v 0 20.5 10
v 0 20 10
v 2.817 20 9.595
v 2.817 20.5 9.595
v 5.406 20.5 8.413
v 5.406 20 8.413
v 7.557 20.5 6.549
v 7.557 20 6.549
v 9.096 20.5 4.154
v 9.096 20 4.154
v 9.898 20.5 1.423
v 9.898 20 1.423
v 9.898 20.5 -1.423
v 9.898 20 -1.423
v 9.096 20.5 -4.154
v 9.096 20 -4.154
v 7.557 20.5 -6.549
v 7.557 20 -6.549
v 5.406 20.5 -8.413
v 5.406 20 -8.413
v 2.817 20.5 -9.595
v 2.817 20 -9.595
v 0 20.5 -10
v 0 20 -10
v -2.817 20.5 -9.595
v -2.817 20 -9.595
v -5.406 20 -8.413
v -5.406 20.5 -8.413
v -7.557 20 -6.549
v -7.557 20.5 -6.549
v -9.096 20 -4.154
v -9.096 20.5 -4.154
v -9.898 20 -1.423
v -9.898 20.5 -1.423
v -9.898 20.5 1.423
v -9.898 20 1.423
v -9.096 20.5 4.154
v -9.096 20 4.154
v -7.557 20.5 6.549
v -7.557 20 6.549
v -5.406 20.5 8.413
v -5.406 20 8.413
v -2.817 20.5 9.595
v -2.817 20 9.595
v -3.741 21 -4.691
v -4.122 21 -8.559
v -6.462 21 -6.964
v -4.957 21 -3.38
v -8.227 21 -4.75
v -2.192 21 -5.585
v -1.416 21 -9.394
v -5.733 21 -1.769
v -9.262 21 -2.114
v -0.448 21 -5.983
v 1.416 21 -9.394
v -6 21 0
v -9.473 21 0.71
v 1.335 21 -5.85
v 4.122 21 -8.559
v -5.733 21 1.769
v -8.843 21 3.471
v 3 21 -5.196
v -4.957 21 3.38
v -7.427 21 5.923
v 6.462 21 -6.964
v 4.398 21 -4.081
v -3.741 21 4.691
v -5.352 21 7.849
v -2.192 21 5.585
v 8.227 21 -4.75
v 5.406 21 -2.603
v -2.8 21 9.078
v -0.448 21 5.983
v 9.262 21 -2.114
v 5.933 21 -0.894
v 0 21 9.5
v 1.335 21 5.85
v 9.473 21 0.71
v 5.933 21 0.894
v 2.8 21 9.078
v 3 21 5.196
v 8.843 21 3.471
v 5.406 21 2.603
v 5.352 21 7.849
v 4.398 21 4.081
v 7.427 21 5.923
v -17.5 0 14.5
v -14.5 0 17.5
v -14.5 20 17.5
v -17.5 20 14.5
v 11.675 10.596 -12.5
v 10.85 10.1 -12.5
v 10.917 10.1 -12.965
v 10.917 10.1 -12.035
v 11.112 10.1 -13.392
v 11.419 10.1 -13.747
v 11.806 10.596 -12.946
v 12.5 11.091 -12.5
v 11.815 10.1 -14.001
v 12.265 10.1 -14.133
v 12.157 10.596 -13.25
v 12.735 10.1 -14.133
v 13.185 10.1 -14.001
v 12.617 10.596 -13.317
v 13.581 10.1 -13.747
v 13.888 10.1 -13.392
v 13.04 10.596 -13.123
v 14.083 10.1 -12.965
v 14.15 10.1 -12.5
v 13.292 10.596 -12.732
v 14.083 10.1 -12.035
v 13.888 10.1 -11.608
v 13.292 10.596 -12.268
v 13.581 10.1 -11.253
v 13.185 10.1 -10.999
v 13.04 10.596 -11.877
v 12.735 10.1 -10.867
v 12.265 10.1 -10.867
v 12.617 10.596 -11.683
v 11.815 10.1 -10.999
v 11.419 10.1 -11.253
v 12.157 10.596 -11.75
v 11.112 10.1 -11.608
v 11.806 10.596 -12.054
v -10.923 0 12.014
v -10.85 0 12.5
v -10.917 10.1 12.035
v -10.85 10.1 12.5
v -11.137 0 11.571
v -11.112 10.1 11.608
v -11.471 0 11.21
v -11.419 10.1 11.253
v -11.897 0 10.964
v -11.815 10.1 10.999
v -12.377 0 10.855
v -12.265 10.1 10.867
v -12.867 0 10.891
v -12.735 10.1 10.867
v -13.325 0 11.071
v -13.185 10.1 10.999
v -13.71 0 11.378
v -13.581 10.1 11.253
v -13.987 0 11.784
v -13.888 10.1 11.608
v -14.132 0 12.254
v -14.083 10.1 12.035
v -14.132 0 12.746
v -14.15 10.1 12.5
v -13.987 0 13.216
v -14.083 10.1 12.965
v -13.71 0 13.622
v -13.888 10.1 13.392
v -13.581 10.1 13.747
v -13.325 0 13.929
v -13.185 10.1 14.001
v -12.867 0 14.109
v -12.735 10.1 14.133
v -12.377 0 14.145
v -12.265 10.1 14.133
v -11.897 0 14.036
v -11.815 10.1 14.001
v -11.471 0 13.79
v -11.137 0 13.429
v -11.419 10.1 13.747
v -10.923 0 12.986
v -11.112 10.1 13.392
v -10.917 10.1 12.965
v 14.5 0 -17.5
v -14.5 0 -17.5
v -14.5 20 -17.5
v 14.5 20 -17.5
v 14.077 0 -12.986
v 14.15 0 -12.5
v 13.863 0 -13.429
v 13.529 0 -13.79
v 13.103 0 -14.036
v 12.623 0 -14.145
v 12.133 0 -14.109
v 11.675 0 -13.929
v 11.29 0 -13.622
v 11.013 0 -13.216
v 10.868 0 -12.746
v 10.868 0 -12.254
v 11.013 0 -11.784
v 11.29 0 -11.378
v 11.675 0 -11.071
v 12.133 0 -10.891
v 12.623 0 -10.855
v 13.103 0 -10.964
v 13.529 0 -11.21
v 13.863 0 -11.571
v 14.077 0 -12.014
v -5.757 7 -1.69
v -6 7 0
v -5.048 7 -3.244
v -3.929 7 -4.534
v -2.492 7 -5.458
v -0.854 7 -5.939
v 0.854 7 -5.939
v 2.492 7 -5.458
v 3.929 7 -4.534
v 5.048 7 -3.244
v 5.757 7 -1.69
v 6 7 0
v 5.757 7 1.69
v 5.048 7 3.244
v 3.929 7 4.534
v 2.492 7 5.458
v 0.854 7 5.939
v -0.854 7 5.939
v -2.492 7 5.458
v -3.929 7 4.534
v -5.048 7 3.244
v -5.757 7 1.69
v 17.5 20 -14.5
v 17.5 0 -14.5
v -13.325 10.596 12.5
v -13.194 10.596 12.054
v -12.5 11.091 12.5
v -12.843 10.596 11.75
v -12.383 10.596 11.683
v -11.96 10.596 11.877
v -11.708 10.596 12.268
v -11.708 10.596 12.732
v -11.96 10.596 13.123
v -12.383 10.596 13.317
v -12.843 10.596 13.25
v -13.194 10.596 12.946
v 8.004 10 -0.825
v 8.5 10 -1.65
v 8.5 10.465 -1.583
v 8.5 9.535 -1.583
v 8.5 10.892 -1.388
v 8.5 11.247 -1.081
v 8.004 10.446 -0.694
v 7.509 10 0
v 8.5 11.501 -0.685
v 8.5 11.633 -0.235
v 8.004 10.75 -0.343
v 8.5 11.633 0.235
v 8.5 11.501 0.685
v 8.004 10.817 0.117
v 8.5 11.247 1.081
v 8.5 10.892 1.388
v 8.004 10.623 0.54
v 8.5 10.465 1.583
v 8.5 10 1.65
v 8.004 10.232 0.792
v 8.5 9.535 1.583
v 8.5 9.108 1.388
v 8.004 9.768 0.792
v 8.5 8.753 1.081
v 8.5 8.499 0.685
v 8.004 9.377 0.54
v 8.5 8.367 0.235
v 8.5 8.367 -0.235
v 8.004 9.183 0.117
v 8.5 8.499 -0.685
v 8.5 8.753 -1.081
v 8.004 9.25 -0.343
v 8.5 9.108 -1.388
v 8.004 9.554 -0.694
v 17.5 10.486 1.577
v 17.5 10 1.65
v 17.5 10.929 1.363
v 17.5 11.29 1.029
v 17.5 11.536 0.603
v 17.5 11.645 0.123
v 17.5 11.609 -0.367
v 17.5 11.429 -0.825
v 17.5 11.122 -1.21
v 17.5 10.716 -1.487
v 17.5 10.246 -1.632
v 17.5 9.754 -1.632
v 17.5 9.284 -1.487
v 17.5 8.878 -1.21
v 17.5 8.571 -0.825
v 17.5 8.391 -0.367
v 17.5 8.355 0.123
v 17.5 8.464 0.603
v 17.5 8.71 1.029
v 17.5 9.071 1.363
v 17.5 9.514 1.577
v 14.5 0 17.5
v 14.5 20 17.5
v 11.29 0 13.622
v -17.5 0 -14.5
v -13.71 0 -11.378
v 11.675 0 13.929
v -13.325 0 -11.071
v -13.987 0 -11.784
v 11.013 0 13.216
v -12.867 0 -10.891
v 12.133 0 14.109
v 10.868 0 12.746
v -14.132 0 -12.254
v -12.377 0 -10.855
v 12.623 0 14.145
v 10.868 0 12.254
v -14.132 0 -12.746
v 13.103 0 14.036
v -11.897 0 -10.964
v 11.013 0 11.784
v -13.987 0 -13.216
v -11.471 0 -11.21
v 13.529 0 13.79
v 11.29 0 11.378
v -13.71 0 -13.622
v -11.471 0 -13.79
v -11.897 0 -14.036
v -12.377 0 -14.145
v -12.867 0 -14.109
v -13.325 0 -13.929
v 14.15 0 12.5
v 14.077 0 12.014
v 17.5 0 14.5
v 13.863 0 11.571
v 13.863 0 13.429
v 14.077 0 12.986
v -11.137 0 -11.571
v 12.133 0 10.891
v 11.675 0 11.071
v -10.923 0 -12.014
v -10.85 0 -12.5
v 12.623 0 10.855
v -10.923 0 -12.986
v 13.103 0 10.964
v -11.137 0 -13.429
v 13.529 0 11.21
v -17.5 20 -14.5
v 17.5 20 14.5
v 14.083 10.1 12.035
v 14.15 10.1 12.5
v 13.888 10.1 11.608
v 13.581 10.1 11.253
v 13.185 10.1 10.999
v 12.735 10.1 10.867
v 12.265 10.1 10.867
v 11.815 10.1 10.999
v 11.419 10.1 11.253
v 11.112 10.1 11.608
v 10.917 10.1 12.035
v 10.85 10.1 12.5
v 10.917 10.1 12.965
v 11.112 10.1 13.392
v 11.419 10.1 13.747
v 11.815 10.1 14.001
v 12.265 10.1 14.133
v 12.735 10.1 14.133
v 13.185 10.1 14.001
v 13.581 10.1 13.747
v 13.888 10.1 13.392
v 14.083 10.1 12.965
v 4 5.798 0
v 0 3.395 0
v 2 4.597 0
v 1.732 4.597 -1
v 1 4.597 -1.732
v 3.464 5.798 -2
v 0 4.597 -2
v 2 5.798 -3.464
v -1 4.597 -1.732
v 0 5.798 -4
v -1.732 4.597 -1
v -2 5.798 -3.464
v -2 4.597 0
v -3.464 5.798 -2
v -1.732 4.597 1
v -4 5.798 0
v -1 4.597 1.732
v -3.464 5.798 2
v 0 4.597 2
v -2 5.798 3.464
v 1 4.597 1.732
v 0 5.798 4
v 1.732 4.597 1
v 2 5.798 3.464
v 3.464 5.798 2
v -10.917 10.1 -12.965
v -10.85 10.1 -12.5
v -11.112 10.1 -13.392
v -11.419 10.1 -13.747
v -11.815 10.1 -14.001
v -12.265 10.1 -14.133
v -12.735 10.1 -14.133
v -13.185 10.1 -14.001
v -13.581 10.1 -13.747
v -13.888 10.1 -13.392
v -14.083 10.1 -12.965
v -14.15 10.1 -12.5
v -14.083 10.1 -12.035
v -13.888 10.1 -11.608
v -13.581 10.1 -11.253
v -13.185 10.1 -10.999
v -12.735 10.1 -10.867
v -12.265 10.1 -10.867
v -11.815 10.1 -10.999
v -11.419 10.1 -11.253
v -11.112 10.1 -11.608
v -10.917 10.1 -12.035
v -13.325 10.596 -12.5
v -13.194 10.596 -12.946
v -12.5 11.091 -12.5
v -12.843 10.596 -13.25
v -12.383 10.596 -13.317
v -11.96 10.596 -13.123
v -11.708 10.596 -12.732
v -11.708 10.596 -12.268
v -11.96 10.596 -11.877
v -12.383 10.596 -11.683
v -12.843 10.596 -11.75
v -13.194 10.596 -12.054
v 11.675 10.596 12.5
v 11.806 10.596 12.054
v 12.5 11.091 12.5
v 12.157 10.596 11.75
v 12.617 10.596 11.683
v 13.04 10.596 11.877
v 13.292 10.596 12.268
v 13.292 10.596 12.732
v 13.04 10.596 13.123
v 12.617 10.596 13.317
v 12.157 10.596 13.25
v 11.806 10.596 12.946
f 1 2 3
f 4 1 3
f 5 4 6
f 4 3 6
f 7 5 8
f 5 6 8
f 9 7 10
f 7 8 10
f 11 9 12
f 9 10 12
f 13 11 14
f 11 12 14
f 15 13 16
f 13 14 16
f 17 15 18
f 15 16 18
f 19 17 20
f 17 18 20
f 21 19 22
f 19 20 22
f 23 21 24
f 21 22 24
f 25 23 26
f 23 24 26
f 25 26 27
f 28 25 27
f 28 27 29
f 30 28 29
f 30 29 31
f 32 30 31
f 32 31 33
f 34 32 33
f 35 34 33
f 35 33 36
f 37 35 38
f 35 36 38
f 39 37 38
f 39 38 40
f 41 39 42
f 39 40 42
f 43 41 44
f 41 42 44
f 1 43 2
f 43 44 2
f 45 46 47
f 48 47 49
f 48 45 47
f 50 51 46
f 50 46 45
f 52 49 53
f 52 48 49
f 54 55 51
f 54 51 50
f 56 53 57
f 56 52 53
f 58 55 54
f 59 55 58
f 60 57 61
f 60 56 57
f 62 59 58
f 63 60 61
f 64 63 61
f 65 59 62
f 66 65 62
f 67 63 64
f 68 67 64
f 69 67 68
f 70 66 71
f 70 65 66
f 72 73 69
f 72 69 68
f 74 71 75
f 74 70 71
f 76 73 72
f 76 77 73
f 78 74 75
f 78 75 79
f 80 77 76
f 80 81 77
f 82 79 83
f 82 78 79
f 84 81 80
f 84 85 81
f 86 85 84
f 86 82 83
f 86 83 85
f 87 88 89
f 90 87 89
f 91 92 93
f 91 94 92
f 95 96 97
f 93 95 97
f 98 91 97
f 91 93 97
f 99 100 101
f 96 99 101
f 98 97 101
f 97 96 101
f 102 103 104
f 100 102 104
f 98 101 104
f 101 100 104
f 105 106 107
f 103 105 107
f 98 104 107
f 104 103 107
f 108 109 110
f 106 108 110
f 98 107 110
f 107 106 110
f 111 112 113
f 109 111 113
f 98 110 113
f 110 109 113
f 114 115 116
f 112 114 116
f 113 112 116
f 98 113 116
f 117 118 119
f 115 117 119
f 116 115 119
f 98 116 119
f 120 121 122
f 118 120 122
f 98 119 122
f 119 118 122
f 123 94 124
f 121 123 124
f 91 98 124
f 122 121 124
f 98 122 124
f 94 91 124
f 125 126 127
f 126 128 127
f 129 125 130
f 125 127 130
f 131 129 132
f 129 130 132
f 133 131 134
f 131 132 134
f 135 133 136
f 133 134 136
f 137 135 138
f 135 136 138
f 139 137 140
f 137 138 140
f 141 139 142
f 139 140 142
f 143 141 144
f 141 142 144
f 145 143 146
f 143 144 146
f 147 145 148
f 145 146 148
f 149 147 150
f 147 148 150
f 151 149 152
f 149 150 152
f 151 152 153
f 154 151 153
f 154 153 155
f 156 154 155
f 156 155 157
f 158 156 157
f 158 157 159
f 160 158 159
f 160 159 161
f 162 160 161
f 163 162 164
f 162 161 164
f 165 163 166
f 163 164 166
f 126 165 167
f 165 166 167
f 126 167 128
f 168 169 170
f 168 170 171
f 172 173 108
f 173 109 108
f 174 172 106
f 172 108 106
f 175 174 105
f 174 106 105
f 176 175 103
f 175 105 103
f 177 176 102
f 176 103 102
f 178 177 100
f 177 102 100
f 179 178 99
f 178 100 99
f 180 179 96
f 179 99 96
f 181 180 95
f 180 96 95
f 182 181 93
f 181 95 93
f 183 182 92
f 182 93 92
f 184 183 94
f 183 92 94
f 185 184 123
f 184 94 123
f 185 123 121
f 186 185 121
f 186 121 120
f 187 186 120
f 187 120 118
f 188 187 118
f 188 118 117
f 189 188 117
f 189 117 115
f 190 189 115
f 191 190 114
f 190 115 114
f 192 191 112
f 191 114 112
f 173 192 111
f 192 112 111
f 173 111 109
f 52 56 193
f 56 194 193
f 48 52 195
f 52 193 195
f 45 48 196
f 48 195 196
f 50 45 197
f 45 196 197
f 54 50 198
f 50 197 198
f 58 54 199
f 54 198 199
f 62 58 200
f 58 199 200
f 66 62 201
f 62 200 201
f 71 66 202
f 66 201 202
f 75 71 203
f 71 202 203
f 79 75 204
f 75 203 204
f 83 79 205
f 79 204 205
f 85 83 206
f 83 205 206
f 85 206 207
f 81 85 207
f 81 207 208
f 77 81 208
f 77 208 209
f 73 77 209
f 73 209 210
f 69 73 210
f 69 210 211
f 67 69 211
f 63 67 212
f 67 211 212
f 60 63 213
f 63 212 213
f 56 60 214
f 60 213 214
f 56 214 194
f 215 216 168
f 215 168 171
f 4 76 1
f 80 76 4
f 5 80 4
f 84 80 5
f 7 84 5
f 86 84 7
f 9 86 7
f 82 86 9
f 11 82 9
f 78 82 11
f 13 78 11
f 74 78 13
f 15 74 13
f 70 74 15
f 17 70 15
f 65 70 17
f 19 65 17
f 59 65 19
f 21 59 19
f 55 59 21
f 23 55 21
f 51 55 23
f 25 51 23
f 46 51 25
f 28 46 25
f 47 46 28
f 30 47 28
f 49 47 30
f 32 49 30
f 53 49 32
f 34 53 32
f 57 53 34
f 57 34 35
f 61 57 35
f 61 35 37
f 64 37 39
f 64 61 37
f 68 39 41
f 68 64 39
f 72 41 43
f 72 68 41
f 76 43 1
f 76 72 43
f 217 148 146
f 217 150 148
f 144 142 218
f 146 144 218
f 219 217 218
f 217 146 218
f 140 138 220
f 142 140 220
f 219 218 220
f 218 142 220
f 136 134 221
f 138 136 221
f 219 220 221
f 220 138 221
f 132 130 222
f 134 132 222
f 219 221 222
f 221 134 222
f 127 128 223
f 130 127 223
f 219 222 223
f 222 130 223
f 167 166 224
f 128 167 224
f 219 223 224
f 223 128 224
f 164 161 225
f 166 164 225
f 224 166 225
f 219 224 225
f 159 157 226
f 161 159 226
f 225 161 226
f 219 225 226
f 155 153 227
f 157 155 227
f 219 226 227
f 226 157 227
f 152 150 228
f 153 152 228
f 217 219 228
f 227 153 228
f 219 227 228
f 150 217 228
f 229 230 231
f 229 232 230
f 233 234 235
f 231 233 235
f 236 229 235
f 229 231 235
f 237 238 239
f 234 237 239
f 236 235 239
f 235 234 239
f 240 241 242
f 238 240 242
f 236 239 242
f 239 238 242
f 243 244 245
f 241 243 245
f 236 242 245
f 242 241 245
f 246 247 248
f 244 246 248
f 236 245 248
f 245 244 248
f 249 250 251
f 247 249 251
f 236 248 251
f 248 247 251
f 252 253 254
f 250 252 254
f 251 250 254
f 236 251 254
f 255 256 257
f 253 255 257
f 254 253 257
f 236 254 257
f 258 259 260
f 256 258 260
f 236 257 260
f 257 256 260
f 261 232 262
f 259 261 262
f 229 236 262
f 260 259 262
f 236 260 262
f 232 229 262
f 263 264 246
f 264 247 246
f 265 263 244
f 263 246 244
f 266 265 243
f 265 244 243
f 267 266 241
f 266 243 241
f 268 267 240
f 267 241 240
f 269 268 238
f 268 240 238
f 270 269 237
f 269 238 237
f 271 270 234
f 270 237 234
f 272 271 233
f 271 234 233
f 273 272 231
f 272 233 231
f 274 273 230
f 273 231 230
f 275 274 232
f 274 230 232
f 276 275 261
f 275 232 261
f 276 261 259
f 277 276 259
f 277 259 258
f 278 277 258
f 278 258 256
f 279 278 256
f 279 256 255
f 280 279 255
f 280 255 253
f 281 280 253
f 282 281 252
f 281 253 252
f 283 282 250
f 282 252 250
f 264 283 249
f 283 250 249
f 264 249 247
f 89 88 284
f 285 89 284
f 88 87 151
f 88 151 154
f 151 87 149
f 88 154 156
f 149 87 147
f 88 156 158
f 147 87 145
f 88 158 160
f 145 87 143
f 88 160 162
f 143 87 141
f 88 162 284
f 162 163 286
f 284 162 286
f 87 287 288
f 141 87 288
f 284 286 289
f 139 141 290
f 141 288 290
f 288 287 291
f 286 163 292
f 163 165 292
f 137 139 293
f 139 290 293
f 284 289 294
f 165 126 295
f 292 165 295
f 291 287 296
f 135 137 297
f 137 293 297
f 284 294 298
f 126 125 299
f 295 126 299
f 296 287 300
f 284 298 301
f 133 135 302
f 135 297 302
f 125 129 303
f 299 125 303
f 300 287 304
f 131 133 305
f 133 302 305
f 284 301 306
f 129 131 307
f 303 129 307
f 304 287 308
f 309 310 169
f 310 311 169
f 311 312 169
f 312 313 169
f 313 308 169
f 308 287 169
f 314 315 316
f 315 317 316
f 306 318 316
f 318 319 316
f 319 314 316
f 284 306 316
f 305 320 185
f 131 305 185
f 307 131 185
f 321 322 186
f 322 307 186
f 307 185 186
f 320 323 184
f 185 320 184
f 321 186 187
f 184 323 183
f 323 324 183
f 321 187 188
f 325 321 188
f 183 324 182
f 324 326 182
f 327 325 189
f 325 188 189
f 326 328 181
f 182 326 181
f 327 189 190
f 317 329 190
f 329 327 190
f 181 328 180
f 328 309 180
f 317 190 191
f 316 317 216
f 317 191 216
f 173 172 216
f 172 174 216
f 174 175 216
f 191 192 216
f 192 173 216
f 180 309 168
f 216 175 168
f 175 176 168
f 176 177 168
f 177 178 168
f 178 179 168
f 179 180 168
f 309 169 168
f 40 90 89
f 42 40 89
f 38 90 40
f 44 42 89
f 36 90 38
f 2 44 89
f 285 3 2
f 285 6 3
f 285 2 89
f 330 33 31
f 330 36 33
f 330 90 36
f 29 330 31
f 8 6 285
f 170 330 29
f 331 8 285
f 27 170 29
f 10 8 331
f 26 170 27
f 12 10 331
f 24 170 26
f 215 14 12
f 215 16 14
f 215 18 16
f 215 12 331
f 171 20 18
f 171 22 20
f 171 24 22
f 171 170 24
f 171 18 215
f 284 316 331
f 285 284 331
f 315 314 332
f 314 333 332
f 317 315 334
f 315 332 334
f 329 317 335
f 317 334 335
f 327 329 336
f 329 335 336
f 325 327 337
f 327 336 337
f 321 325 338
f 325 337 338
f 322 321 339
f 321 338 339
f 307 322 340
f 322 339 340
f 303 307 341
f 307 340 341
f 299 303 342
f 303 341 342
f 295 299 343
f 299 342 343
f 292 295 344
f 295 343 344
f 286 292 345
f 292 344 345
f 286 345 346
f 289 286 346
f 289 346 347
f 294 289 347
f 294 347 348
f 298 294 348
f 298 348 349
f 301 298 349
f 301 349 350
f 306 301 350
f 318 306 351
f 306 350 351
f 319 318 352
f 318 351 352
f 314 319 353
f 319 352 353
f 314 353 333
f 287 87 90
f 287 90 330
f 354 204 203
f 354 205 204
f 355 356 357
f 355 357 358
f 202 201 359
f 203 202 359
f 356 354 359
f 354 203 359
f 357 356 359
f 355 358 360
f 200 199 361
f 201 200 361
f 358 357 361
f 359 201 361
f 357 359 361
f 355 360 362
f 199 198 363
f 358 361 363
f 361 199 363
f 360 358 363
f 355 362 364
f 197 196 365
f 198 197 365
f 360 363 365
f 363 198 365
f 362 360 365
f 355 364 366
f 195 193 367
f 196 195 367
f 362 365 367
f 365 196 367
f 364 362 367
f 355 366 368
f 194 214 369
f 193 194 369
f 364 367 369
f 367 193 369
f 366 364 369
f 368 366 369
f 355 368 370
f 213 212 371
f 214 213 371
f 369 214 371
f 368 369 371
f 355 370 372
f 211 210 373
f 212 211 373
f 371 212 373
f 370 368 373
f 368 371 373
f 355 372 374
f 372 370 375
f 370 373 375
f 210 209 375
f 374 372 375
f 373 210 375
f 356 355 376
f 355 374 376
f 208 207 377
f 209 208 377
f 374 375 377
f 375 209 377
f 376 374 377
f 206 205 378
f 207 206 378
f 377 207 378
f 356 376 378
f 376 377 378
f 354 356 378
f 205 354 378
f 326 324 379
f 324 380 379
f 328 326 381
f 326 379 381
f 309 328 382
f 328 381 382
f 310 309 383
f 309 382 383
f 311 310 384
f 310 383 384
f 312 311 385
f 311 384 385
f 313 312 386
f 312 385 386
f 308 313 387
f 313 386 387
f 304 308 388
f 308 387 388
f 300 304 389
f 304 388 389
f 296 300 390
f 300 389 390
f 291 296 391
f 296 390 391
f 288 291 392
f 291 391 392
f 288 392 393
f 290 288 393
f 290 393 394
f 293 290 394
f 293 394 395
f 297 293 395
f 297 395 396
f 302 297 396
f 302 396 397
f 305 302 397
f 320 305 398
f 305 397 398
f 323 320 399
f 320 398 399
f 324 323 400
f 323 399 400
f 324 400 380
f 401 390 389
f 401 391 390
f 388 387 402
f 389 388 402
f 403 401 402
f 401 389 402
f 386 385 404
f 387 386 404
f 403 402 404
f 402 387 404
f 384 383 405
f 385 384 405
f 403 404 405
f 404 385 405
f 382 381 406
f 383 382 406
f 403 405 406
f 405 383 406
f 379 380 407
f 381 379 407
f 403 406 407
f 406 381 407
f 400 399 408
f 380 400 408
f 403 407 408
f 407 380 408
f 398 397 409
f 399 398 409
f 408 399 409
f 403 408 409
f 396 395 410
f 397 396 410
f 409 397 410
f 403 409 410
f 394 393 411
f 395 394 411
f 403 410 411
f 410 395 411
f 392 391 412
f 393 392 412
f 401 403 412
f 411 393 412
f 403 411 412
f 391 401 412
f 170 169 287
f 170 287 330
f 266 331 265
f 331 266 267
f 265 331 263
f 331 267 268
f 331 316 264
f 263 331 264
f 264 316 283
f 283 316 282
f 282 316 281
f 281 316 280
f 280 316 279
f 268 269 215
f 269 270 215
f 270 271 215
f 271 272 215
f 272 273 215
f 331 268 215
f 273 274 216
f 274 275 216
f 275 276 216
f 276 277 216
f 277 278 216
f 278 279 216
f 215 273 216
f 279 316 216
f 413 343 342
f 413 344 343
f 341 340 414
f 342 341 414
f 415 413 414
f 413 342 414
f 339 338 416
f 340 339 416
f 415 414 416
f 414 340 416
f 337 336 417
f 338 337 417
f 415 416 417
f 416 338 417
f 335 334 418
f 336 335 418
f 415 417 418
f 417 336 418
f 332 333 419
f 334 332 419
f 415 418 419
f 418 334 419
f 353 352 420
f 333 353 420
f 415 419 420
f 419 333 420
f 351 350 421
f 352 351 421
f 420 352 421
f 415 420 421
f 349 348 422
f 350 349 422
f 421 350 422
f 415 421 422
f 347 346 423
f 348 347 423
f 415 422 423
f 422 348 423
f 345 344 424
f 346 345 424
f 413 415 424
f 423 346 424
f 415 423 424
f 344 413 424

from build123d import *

# Parameters (mm, degrees)
SKETCH1_W              = 35
SKETCH1_H              = 35
BOSS_EXTRUDE1_DEPTH    = 20
SKETCH2_R              = 10
BOSS_EXTRUDE2_DEPTH    = 1
M14_TAPPED_HOLE1_D     = 12
M14_TAPPED_HOLE1_DEPTH = 14
M14_TAPPED_HOLE1_TIP   = 3.605163714
M4_TAPPED_HOLE1_D      = 3.3
M4_TAPPED_HOLE1_DEPTH  = 10.1
M4_TAPPED_HOLE1_TIP    = 0.991420021
M4_TAPPED_HOLE2_D      = 3.3
M4_TAPPED_HOLE2_DEPTH  = 9
M4_TAPPED_HOLE2_TIP    = 0.991420021
CHAMFER1_SIZE          = 3
CHAMFER2_SIZE          = 0.5


with BuildPart() as part:
    # Sketch1 → Boss-Extrude1 (new body)
    with BuildSketch(Plane(origin=(0, 0, 0), x_dir=(1, 0, 0), z_dir=(0, 1, 0))):
        Rectangle(SKETCH1_W, SKETCH1_H)
    extrude(amount=BOSS_EXTRUDE1_DEPTH)

    # Sketch2 → Boss-Extrude2 (add)
    with BuildSketch(Plane(origin=(0, 20, 0), x_dir=(1, 0, 0), z_dir=(0, 1, 0))):
        with Locations(Location((0, 0, 0), (0, 0, 270))):
            Circle(SKETCH2_R)
    extrude(amount=BOSS_EXTRUDE2_DEPTH)

    # M14 Tapped Hole1
    with Locations(Plane(origin=(0, 21, 0), x_dir=(1, 0, 0), z_dir=(0, 1, 0))):
        with Locations((0, 0)):
            Hole(M14_TAPPED_HOLE1_D / 2, depth=M14_TAPPED_HOLE1_DEPTH)
            with Locations((0, 0, -(M14_TAPPED_HOLE1_DEPTH + M14_TAPPED_HOLE1_TIP / 2))):  # 118° drill point
                Cone(0, M14_TAPPED_HOLE1_D / 2, M14_TAPPED_HOLE1_TIP, mode=Mode.SUBTRACT)

    # M4 Tapped Hole1
    with Locations(Plane(origin=(0, 0, 0), x_dir=(-1, 0, 0), z_dir=(0, -1, 0))):
        with Locations((-12.5, 12.5), (-12.5, -12.5), (12.5, -12.5), (12.5, 12.5)):
            Hole(M4_TAPPED_HOLE1_D / 2, depth=M4_TAPPED_HOLE1_DEPTH)
            with Locations((0, 0, -(M4_TAPPED_HOLE1_DEPTH + M4_TAPPED_HOLE1_TIP / 2))):  # 118° drill point
                Cone(0, M4_TAPPED_HOLE1_D / 2, M4_TAPPED_HOLE1_TIP, mode=Mode.SUBTRACT)

    # M4 Tapped Hole2
    with Locations(Plane(origin=(17.5, 0, 0), x_dir=(0, 0, -1), z_dir=(1, 0, 0))):
        with Locations((0, 10)):
            Hole(M4_TAPPED_HOLE2_D / 2, depth=M4_TAPPED_HOLE2_DEPTH)
            with Locations((0, 0, -(M4_TAPPED_HOLE2_DEPTH + M4_TAPPED_HOLE2_TIP / 2))):  # 118° drill point
                Cone(0, M4_TAPPED_HOLE2_D / 2, M4_TAPPED_HOLE2_TIP, mode=Mode.SUBTRACT)

    # Chamfer1
    chamfer1_edges = [part.edges().sort_by_distance(p)[0] for p in [
        (-17.5, 10, -17.5),
        (17.5, 10, -17.5),
        (17.5, 10, 17.5),
        (-17.5, 10, 17.5),
    ]]
    chamfer(chamfer1_edges, length=CHAMFER1_SIZE)

    # Chamfer2
    chamfer2_edges = [part.edges().sort_by_distance(p)[0] for p in [
        (0, 21, -10),
    ]]
    chamfer(chamfer2_edges, length=CHAMFER2_SIZE)


solid = part.part
